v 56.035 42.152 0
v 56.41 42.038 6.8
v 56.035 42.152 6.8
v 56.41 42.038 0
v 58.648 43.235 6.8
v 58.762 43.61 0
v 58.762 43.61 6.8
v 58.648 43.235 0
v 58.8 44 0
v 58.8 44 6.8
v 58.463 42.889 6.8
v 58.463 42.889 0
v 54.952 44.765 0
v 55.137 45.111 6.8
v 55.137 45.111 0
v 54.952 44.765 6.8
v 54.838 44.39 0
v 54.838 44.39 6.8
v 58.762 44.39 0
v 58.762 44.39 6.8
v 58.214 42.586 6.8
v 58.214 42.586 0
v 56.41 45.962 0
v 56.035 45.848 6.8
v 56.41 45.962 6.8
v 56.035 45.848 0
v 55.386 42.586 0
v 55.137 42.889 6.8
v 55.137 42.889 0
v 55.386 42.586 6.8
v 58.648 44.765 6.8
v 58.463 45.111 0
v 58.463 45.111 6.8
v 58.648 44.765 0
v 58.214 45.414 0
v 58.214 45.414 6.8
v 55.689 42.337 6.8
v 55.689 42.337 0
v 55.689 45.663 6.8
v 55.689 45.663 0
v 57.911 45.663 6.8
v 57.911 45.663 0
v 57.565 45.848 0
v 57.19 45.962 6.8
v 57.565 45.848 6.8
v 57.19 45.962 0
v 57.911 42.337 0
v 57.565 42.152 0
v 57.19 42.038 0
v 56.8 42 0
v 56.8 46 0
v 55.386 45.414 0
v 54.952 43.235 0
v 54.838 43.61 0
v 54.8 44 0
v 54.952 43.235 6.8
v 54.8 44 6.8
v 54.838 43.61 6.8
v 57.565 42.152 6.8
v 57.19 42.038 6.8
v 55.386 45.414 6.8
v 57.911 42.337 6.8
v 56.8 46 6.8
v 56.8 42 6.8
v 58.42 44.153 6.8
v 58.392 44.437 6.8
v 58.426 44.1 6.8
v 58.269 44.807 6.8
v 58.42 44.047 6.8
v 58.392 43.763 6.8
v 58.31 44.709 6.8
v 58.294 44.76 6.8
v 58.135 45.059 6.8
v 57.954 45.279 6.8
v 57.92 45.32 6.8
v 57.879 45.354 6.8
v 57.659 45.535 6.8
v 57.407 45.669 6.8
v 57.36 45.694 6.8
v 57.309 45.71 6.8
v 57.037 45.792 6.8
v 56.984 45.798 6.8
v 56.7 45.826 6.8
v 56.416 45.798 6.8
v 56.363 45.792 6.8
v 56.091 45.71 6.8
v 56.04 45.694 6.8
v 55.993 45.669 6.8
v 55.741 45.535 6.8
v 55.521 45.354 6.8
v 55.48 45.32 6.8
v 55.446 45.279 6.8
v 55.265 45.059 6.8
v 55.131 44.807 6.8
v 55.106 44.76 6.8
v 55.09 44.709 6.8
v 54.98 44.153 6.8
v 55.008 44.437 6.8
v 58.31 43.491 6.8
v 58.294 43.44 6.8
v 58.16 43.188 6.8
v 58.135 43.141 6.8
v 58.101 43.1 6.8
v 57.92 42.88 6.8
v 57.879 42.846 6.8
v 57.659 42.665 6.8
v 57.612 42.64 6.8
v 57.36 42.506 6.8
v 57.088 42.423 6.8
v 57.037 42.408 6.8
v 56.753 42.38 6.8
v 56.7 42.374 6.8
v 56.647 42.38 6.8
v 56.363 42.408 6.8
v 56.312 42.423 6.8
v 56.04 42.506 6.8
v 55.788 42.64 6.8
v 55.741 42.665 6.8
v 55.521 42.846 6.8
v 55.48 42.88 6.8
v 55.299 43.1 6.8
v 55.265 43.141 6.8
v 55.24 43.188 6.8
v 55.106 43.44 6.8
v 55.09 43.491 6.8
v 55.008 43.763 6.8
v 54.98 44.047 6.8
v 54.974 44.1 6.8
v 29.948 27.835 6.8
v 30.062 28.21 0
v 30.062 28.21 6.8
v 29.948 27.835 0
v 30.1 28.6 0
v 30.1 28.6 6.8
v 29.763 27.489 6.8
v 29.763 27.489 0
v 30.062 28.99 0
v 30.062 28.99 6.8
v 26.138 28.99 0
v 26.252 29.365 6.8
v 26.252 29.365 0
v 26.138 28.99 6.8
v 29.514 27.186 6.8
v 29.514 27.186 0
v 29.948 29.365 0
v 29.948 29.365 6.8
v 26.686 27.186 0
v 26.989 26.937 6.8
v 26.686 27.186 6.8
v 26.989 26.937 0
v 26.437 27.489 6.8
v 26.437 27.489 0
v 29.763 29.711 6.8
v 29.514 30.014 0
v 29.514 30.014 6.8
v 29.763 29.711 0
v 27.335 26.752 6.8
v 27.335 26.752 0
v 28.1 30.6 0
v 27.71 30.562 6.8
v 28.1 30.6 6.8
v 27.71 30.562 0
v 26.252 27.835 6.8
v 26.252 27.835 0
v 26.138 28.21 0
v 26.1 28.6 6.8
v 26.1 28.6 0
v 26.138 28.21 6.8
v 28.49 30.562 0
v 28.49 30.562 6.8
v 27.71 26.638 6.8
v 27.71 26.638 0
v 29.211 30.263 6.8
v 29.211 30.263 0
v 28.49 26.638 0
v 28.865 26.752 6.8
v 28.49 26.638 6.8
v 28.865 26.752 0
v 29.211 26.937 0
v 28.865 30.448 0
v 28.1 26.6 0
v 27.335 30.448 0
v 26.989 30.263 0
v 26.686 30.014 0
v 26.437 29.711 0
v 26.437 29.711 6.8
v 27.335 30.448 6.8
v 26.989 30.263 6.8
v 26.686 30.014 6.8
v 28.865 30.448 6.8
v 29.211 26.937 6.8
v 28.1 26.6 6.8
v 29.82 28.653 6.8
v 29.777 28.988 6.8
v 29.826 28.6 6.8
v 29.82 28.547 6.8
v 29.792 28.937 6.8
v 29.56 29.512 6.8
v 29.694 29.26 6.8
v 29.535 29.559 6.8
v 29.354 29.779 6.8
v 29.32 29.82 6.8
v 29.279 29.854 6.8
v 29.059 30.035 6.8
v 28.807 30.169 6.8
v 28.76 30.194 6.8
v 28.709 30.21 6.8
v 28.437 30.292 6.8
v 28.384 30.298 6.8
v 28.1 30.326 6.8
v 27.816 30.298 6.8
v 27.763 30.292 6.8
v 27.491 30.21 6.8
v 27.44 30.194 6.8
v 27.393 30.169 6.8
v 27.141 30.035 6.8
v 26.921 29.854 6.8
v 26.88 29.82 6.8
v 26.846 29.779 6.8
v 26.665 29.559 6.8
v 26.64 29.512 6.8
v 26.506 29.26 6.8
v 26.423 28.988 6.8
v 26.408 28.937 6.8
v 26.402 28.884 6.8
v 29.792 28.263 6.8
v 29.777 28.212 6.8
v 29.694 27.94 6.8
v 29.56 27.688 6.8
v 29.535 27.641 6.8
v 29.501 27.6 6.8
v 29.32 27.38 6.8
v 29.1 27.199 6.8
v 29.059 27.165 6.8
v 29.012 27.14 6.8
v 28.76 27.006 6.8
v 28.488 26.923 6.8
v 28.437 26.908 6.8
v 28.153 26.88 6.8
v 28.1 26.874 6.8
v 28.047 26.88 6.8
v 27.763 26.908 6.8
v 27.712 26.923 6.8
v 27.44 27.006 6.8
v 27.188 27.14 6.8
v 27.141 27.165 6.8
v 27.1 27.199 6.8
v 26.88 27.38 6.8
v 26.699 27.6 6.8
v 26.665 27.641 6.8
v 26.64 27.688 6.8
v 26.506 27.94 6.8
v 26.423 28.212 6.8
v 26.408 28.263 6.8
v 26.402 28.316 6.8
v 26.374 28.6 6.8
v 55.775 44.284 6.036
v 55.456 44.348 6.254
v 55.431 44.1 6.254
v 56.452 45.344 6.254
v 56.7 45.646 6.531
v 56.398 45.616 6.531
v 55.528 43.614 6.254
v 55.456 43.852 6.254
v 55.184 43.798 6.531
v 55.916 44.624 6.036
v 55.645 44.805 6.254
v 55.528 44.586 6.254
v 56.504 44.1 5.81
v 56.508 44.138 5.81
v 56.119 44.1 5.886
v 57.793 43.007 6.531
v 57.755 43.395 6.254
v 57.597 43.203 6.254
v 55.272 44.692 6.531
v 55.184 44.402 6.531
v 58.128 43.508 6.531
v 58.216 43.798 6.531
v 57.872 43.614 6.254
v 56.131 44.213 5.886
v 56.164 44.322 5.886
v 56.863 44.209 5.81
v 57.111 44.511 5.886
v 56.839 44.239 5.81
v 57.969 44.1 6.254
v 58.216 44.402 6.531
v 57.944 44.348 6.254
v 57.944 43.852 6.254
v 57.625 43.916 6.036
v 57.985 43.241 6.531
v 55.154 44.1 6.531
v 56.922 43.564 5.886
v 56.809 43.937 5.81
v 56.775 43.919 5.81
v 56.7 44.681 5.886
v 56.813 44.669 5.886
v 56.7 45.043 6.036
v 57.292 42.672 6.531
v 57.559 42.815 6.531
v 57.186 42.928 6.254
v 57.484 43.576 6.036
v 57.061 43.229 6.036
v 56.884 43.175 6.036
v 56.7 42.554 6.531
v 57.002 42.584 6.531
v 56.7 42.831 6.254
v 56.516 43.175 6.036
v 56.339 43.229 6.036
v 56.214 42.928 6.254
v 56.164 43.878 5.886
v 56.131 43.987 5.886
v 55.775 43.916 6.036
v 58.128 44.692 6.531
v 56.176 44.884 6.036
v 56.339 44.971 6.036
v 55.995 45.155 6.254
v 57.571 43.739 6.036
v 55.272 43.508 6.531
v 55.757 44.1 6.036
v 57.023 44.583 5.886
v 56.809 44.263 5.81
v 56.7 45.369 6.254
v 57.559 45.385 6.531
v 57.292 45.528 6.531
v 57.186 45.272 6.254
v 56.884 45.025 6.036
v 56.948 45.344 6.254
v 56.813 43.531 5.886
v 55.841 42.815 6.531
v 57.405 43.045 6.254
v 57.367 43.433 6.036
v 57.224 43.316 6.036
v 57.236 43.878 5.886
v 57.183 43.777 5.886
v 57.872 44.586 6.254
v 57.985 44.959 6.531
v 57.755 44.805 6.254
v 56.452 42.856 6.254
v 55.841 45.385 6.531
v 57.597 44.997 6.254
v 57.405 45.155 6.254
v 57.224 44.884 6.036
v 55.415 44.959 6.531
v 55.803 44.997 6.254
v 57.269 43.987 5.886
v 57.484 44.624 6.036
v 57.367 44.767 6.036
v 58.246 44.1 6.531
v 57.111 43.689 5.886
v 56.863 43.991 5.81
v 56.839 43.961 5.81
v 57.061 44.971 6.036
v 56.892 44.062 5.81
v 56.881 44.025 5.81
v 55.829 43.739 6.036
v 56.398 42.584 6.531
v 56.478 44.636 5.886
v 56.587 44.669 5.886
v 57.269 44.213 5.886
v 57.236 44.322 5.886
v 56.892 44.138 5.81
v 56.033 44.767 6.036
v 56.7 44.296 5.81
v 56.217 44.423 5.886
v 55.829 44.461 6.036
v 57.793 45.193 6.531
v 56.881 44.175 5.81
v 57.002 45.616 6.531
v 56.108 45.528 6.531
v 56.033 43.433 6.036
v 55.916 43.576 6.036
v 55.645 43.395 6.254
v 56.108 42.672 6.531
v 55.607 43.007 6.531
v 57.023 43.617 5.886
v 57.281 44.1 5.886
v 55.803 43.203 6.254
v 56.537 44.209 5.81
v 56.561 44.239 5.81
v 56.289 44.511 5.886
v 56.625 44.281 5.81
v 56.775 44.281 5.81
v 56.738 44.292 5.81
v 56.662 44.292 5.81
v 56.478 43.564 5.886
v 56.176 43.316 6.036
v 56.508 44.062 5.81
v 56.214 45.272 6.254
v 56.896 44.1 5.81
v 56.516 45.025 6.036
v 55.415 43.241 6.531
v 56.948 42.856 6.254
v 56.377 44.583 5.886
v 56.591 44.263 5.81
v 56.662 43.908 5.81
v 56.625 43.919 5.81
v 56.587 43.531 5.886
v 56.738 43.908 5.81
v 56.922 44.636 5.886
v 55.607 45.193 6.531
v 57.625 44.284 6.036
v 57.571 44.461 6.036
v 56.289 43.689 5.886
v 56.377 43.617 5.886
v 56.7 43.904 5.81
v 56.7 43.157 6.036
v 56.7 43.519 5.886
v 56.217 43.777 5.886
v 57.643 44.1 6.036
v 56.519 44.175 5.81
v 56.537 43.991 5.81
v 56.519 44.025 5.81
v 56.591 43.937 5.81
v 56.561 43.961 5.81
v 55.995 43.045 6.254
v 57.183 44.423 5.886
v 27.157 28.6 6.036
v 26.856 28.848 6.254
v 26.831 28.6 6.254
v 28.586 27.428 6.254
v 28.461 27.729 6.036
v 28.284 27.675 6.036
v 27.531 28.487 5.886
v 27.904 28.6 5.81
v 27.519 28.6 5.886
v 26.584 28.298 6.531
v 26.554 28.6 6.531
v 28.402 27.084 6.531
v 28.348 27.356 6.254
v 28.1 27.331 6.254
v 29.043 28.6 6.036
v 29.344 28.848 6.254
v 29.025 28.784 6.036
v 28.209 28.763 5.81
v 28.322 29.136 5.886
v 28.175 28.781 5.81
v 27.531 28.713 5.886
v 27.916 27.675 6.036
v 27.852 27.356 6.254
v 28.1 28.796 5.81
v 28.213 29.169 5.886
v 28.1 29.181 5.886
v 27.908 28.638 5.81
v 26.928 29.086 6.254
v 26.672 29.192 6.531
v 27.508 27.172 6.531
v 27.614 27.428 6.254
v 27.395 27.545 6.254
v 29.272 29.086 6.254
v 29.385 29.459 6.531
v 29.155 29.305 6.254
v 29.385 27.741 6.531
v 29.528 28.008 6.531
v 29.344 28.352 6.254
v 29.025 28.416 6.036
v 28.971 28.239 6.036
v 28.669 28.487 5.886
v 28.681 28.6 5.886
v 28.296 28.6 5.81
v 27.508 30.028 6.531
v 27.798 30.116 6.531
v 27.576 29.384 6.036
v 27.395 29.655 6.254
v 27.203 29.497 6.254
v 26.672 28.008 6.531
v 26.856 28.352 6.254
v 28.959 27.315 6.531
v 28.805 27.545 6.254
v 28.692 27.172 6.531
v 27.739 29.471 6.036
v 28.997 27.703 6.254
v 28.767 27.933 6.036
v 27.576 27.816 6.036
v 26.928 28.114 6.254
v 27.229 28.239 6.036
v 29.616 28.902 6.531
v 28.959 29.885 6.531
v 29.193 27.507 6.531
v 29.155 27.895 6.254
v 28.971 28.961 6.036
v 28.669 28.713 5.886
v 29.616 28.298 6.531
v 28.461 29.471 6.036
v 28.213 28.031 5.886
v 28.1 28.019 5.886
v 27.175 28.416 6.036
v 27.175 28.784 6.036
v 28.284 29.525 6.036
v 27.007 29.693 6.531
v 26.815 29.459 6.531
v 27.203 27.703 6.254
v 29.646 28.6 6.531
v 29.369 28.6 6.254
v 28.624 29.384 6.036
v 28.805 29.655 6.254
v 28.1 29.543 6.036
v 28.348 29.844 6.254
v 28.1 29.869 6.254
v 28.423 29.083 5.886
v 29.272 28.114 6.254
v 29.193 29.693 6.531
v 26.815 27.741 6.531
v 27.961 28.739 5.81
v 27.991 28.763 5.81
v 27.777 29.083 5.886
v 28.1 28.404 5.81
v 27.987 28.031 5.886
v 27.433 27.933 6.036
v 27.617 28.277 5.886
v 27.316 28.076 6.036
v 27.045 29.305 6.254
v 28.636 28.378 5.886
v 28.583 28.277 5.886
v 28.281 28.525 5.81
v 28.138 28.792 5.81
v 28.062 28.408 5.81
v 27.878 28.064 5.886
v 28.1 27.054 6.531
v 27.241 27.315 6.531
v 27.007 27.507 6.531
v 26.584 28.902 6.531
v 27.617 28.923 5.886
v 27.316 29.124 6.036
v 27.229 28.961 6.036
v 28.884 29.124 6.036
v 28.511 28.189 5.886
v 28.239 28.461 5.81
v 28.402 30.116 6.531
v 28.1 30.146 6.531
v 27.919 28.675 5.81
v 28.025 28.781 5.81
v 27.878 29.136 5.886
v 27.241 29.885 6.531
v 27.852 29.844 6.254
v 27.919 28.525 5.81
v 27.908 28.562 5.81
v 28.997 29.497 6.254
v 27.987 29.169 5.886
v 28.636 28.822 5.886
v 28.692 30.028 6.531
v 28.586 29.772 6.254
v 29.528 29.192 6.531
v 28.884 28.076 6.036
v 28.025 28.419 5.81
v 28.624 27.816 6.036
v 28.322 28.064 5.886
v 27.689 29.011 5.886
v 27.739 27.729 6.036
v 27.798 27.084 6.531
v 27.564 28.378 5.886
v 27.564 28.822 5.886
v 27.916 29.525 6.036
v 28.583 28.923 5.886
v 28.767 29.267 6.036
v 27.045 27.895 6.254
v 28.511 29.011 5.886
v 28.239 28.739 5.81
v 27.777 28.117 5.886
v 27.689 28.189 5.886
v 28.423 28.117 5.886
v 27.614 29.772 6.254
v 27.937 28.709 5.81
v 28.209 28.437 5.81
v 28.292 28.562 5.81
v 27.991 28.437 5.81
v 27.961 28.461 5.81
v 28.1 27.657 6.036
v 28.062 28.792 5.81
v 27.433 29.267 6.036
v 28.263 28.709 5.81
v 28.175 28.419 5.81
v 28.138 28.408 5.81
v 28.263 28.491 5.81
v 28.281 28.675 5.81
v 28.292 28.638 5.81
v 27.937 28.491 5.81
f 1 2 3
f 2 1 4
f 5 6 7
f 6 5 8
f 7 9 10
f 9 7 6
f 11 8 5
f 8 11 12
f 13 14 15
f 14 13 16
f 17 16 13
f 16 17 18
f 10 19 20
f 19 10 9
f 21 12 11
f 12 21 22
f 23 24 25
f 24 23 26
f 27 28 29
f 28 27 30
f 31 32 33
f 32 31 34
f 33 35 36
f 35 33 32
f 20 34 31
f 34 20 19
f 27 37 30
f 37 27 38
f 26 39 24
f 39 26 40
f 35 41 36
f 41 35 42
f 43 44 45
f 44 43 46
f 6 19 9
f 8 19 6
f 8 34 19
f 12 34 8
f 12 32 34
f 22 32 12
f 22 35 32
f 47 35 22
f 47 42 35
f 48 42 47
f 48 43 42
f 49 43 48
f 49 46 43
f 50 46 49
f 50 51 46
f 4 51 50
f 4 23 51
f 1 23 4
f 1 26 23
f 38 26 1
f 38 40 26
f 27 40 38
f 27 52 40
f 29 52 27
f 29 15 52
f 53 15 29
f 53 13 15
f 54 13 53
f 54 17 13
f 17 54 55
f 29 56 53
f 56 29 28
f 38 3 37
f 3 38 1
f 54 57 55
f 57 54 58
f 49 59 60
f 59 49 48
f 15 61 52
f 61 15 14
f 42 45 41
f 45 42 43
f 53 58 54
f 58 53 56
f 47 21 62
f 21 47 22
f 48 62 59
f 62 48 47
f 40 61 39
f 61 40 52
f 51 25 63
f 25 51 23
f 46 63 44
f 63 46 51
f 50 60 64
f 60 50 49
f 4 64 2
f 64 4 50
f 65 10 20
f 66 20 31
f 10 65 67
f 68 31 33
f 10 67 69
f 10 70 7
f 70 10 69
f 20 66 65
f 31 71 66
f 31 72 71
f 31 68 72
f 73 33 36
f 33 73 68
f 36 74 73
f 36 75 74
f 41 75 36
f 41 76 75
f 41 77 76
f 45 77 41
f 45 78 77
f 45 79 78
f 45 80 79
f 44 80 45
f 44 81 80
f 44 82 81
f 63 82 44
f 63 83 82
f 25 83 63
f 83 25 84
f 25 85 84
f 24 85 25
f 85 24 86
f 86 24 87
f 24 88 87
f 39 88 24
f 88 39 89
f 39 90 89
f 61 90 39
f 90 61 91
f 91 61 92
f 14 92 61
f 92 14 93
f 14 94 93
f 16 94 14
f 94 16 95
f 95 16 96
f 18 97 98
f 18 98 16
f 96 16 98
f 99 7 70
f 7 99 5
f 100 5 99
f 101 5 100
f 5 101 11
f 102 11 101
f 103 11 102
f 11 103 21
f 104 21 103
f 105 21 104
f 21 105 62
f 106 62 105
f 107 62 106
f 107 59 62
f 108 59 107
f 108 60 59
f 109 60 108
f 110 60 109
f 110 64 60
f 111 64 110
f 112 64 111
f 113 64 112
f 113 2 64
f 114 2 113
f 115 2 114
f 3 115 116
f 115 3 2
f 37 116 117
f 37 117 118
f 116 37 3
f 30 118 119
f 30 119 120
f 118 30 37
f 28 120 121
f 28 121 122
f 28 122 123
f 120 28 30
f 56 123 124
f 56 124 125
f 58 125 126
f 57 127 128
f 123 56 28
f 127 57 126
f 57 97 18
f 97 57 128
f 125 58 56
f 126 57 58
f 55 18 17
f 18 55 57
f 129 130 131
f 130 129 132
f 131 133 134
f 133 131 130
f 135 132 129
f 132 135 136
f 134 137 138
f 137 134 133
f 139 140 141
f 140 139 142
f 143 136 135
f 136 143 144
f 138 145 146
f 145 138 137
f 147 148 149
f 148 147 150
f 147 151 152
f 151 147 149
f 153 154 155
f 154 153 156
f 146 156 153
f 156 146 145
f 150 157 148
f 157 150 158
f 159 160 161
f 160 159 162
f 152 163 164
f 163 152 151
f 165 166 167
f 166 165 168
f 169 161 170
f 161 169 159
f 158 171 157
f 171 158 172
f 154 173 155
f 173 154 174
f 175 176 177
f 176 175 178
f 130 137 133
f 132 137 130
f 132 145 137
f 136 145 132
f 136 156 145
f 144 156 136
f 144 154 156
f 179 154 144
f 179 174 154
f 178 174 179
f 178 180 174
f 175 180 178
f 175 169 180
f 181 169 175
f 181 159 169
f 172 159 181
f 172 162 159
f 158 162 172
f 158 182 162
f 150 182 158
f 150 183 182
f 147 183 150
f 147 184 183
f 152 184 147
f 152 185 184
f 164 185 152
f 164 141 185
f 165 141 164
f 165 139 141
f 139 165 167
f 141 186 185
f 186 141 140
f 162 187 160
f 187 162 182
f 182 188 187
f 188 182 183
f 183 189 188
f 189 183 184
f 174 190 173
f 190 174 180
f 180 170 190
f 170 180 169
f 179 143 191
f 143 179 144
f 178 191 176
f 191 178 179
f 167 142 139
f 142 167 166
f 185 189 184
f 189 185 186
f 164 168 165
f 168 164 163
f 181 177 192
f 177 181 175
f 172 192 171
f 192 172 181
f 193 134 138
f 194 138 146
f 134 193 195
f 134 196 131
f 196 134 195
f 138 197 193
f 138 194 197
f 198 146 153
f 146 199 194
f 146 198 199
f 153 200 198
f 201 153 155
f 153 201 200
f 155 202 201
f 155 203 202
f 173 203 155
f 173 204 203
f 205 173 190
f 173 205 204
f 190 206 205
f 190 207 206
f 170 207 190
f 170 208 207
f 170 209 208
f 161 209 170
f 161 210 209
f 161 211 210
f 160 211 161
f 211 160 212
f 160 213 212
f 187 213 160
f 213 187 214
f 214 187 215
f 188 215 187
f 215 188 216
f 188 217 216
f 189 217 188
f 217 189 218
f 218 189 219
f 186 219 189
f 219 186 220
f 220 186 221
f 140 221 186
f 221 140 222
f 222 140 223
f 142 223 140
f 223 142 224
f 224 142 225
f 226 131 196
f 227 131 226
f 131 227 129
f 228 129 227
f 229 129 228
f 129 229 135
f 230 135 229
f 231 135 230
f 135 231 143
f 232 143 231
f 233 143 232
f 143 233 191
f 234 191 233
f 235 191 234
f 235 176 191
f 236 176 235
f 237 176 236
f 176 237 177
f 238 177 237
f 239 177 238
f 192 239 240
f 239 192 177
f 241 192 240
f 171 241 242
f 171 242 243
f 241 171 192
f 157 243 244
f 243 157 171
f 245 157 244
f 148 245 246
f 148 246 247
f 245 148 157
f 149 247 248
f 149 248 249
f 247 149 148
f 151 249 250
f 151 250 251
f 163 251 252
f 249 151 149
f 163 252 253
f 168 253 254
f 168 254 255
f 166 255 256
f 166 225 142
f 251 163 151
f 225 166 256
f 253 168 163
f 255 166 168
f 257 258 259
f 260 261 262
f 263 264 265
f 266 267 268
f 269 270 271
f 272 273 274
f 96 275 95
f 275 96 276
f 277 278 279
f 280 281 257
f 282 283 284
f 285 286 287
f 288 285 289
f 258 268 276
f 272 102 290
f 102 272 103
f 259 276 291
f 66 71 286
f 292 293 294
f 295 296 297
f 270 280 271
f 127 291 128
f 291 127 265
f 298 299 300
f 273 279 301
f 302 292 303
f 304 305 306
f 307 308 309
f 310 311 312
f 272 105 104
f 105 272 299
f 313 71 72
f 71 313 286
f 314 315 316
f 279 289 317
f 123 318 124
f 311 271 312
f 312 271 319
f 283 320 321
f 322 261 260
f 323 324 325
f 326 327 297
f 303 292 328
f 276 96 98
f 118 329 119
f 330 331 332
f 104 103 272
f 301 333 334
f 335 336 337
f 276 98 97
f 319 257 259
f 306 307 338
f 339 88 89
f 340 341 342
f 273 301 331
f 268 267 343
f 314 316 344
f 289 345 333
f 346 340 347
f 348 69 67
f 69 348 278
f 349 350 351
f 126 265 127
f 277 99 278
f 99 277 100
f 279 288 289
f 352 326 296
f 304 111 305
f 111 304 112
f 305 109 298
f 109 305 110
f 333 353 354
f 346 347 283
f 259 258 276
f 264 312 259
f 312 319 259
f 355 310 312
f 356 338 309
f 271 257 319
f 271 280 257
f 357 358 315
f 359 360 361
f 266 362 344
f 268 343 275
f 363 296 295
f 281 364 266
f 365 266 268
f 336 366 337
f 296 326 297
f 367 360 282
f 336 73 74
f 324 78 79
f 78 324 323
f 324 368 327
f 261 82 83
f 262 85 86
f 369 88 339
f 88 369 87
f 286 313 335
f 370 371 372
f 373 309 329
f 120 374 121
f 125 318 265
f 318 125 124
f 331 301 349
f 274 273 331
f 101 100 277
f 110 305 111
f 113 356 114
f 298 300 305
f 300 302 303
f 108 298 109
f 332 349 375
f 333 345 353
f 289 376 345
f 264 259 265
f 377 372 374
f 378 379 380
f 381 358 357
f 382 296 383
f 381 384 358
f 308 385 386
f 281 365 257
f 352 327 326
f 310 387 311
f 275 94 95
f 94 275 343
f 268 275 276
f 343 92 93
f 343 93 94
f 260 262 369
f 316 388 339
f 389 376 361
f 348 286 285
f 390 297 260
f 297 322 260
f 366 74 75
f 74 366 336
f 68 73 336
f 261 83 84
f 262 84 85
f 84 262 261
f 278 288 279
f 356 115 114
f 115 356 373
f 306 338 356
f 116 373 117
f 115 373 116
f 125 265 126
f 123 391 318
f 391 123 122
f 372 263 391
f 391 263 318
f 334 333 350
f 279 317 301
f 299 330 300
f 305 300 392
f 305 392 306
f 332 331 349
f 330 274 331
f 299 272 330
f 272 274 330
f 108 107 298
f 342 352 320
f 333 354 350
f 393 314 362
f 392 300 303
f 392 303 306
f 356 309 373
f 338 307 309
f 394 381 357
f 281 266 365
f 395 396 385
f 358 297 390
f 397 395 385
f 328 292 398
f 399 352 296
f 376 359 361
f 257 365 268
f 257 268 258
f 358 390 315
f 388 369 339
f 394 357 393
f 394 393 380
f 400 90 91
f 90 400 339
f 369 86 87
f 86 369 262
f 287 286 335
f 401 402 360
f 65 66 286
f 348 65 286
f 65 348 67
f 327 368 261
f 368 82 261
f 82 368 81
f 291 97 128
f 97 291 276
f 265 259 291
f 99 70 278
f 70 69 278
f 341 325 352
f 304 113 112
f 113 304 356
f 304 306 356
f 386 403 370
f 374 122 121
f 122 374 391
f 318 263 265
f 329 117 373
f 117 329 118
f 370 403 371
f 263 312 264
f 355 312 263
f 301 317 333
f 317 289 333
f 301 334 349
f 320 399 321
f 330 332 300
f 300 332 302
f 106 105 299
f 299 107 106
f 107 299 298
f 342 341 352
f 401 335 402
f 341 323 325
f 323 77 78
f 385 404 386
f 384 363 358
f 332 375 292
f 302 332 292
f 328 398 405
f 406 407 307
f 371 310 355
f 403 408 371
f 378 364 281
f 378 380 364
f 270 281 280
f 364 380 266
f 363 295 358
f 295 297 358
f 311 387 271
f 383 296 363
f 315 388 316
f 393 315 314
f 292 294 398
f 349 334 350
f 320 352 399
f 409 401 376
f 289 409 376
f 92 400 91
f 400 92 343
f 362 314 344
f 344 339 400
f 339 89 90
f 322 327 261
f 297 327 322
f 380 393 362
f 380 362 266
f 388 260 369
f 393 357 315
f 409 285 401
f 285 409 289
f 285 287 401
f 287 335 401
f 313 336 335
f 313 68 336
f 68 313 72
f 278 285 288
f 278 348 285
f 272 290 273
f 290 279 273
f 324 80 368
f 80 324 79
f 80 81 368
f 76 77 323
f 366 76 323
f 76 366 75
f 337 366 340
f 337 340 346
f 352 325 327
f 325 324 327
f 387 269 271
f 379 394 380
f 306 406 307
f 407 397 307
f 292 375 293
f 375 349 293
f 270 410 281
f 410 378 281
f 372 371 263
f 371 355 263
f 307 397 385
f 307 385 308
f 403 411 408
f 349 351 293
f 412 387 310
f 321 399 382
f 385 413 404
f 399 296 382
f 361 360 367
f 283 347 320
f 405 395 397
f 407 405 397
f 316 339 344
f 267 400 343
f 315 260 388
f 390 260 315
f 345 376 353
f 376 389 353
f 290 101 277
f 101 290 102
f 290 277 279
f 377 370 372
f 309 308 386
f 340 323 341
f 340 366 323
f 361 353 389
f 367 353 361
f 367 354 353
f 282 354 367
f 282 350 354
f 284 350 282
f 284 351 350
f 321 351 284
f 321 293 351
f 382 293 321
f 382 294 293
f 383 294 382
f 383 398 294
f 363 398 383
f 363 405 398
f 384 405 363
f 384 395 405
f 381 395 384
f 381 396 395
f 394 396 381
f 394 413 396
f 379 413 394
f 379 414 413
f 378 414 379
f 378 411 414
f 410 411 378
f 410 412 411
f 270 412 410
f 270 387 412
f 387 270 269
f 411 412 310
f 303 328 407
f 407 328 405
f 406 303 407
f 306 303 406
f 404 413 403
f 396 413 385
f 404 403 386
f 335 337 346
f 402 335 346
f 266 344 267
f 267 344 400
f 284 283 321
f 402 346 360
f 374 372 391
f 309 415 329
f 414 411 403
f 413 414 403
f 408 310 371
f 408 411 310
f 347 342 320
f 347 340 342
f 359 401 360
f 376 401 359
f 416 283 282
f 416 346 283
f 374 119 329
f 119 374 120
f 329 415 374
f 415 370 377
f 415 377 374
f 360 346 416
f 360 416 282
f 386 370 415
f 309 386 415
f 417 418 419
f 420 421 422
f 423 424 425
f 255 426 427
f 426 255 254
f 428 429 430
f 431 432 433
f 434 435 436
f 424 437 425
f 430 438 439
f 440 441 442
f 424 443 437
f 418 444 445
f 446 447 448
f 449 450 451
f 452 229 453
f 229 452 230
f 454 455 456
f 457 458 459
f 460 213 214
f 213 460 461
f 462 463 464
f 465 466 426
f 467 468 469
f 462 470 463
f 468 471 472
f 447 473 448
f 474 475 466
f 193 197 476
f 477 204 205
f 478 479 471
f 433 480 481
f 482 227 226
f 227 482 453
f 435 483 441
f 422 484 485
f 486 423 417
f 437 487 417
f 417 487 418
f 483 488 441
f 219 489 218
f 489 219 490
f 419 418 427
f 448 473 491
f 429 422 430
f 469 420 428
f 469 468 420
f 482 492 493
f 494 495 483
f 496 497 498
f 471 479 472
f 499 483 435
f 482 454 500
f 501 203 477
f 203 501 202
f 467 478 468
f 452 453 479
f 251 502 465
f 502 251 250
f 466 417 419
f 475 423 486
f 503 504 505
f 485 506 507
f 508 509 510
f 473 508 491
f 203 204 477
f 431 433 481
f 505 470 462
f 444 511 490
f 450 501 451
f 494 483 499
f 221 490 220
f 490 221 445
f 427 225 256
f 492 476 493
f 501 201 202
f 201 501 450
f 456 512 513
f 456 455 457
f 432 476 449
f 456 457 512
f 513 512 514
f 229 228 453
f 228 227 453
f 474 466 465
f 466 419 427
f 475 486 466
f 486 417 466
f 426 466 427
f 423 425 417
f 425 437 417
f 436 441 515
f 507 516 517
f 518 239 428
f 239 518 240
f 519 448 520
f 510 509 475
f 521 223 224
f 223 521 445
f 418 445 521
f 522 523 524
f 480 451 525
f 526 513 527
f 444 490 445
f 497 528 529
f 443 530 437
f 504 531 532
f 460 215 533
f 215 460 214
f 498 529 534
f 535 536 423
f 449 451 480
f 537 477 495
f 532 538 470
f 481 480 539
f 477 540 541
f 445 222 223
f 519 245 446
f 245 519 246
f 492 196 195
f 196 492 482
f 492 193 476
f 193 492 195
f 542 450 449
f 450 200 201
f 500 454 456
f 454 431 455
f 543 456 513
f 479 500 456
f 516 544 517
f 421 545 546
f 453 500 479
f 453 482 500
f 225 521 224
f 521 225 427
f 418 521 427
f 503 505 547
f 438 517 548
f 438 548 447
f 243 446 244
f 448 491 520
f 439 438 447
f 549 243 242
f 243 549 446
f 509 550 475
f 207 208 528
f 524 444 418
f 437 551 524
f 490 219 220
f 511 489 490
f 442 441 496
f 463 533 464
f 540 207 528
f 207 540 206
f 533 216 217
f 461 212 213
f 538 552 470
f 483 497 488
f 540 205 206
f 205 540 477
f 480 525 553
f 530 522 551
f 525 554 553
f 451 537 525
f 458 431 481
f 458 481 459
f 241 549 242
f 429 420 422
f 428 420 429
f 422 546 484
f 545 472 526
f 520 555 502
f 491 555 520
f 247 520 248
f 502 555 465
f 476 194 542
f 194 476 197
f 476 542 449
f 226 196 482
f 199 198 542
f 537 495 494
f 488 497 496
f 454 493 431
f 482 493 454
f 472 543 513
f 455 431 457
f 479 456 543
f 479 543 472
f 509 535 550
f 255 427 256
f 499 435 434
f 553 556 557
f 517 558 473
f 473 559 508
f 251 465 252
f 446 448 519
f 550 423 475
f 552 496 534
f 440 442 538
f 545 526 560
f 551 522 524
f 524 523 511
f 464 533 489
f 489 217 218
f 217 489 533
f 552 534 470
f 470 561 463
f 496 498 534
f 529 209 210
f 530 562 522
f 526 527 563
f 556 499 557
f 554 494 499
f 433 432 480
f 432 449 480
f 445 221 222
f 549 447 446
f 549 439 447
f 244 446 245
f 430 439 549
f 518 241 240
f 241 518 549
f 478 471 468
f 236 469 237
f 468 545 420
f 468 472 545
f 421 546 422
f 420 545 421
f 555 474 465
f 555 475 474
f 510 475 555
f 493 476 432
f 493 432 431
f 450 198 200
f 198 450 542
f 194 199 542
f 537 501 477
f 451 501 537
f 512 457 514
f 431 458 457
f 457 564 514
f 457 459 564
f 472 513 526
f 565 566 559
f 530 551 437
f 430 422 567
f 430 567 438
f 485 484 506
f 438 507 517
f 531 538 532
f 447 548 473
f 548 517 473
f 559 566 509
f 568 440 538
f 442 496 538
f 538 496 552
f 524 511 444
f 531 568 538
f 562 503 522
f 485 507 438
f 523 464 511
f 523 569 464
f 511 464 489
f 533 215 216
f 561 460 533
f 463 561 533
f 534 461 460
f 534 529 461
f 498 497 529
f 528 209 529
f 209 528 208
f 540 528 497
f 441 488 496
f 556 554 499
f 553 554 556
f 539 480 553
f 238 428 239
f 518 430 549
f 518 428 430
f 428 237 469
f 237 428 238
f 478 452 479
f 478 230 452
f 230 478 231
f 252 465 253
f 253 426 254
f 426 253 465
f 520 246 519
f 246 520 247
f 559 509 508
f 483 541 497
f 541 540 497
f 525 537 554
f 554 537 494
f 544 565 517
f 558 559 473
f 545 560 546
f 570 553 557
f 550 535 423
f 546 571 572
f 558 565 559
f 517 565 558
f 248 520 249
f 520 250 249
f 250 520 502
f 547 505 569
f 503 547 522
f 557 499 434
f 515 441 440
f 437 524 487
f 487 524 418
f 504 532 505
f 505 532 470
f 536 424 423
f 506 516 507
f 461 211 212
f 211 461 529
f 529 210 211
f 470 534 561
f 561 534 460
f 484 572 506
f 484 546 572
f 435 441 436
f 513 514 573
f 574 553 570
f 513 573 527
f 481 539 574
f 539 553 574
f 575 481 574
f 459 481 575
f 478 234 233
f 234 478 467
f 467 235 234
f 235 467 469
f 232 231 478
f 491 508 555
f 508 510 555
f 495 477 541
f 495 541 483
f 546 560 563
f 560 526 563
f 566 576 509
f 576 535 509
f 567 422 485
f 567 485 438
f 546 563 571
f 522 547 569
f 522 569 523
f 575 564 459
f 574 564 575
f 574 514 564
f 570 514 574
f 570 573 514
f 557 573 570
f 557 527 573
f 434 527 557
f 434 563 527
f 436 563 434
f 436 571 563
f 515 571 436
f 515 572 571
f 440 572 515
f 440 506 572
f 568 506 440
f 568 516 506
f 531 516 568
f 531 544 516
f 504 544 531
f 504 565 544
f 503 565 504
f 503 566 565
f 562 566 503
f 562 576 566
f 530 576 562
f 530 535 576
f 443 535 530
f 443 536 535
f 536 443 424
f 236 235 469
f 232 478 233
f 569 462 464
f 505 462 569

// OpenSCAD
// OpenSCAD 2019.05
// Tiva Case - enclosure, REV-001
// Joe Haas, KE0FF, 12/16/2021
// This is an enclosure for an EK-TM4C123GXL LaunchPad board and a custom LaunchPad
//	carrier board.
//
// Rev-002, 12/21/2021
//	incorporated fixes from first print run
//	increased lid thickness to provide more room for LP board
//
// Rev-001, 12/16/2021
//	initial code -- copied from uxcover

//use <char.scad>

//----------------------------------------------------------------------------------------------------------------------
// User defined parameters.  Modify these to suit a particular application
// NOTE: All data in this file is in mm

//----------------------------------------------------------------------------------------------------------------------
// parametric variables:

width = 67.5;
wcut = 10;
length = 87.2;
lcut = 10;
height = 20.8; //28.2;
heightl = 8;
lheight = 15;
wthick = 3.5;
wthickt = 1.5;
crad = 5;
crad2 = crad/2;

// X-rulers
//#translate([-.69,0,0]) cube([0.01,30,50]);	// ruler
//#translate([175.41,0,0]) cube([0.01,30,50]);	// inside main void ruler 1
//#translate([1.67,0,0]) cube([0.01,30,50]);	// inside main void ruler 2
//#translate([175.34,0,0]) cube([0.01,30,50]);	// outside shroud ruler 2
// Y-rulers
//#translate([0,23.81,0]) cube([180,0.01,50]);	// ruler
//#translate([0,22.36 ,0]) cube([180,0.01,50]);	// ruler
// Z-rulers
//#translate([0,0,0]) cube([10,40,.01]);	// ruler
//#translate([0,0,2.04]) cube([9,40,.01]);	// ruler

// Set each variable to "1" to render that part (only one part at a time).  Set all = "0" to enable composite
//	rendering (below).

plotlid = 0;
plotcase = 0;
plotlp = 1;

/////////////////////////////////////

if(plotlid) lid(1);
if(plotlp) lid_lpipe();
if(plotcase) case();

// Composite plot.  Places all elements in an assembly orientation

if(!plotlid && !plotlp && !plotcase){
//	translate([0,0,0]) tiva_assy();
	difference(){
		union(){
			color("darkslategray",0.98) case();
			translate([0,length,height+heightl]) rotate([180,0,0]) color("darkslategray",1.0) lid(1);
			translate([0,length,height+heightl]) rotate([180,0,0]) lid_lpipe();
		}
//		translate([-1,40,-1]) cube([90,60,90]);		// cut-away viewing
	}
}

//////////////////****************\\\\\\\\\\\\\\\\\\
				//    modules     \\
				//****************\\

///////////////
// Bottom shell

module case(){
	difference(){
		union(){
			difference(){
				union(){
					cube([width,length,height]);
//					translate([19.1,88,0]) cube([2,2,23.6]); // test-ruler
				}
				translate([19.1,76,15.4]) cube([10.5,16,8.1]); 							// USB shroud
				cube([crad,crad,60], center=true);										// corner notch
				translate([width,0,0]) cube([crad,crad,60], center=true);				// corner notch
				translate([0,length,0]) cube([crad,crad,60], center=true);				// corner notch
				translate([width,length,0]) cube([crad,crad,60], center=true);			// corner notch
				translate([3.5,3.5,4.5]) cube([60.5,80.2,21.2]);						// main hog-out
				translate([3.5+6.5,3.5,4.5-2.5]) cube([60.5-13,80.2,5]);				// "Y" under PCB hog-out
				translate([3.5,3.5+6+3,4.5-2.5]) cube([60.5,80.2-12-6,5]);				// "X" under PCB hog-out
				translate([57.3,47,.5]) cube([5,11.4,4.5]);								// jtag port
				translate([width/2,length/2,11]) tiva_lp_mtg(10);						// pcb mtg holes
				translate([width/2,length/2,0]) tiva_lp_mtg_cs();						// pcb mtg hole counter-sinks
				translate([.08+(width/2),1.5,9]) rotate([270,0,0]) db9();				// DB9 cutout
				translate([width/2,length/2,11]) sma_pilot();							// sma pilots (RF3 & RF4)
				translate([width/2,length/2,11]) sma2_pilot();							// sma pilots, RF2
				translate([width/2,length/2+21.4,11]) sma2_pilot();						// sma pilots, RF1
				translate([6.5,1.5,15.9]) cube([width-12.5,4,5]);						// tiva groove
//				translate([(width-15)/2,-.01,height-2.7]) rotate ([-20,0,0]) cube([15,wthickt+4,2.8]);		// lip0
//				translate([(width-15)/2,-.01,height-2.7]) rotate ([0,0,-10]) polygon([0,0],[);		// lip0
//				translate([width/2,9.99,25.6]) rotate([90,0,0]) rotate([0,0,45]) cylinder(h=10,r1=(21.2/2)+1.76,r2=21.2/2,$fn=4);
//				translate([(width-15)/2,-.01,height-2.7]) cube([15,wthickt+4,2.8]);		// lip0
			}
			translate([crad2,crad2,0]) cylinder(r=crad/2, h=height, $fn=32, center=false);		// corner radius (x4)
			translate([width-crad2,crad2,0]) cylinder(r=crad/2, h=height, $fn=32, center=false);
			translate([crad2,length-crad2,0]) cylinder(r=crad/2, h=height, $fn=32, center=false);
			translate([width-crad2,length-crad2,0]) cylinder(r=crad/2, h=height, $fn=32, center=false);
		}
//		translate([17.5,length-4,18]) pilot(1);											// usb pilot
		translate([15,length-4,17.3]) pilot();											// pilot
		translate([47,length-4,17.3]) pilot();											// pilot
		translate([4,20,17.3]) rotate([0,0,90]) pilot();								// pilot
		translate([4,67,17.3]) rotate([0,0,90]) pilot();								// pilot
		translate([width-4,20,17.3]) rotate([0,0,90]) pilot();							// pilot
		translate([width-4,67,17.3]) rotate([0,0,90]) pilot();							// pilot
		translate([15,15,1.5]) linear_extrude(1) text("REV 2", size=6);					// version & PN texts
		translate([15,25,1.5]) linear_extrude(1) text("TivaLP bot", size=6);
	}
}

////////////
// Top cover

module lid(hole){
	difference(){
		union(){
			difference(){
				union(){
					cube([width,length,heightl]);													// main lid
				}
				cube([crad,crad,60], center=true);													// corner nibble
				translate([width,0,0]) cube([crad,crad,60], center=true);							// corner nibble
				translate([0,length,0]) cube([crad,crad,60], center=true);							// corner nibble
				translate([width,length,0]) cube([crad,crad,60], center=true);						// corner nibble
				translate([wthick,wthick,2]) cube([60.5,80.2+wthickt,21.2]);						// main hog-out
				translate([0,length,(height)]) rotate([180,0,0]) tiva_assy(1);		// "1" param burns button/LP holes
			}
			translate([wcut/2,wthick,0]) cube([width-wcut,wthick,lheight]);							// lip
//			translate([(width-15)/2,length-(wthickt)-.001,5]) cube([15,wthickt,5.5]);				// lip0
			translate([wcut/2,length-(wthick/2)-(wthickt)-.001,1]) cube([width-wcut,wthick/2,8]);	// lip0
			translate([wcut/2,length-(wthick/2)-(wthickt)-2,1]) cube([2,2.1,8]);					// lip0 tie-in
			translate([width-(wthick*2),length-(wthick/2)-(wthickt)-2,1]) cube([2,2.1,8]);			// lip0 tie-in
			translate([wthick,wcut/2,0]) cube([wthick,length-wcut,lheight]);						// lip
			translate([width-(2*wthick),wcut/2,0]) cube([wthick,length-wcut,lheight]);				// lip
			translate([crad2,crad2,0]) cylinder(r=crad/2, h=heightl, $fn=32, center=false);			// corner
			translate([width-crad2,crad2,0]) cylinder(r=crad/2, h=heightl, $fn=32, center=false);	// corner
			translate([crad2,length-crad2,0]) cylinder(r=crad/2, h=heightl, $fn=32, center=false);	// corner
			translate([width-crad2,length-crad2,0]) cylinder(r=crad/2, h=heightl, $fn=32, center=false);	// corner
		}
		translate([19.1,-1,lheight-1.7-8]) cube([10.5,16,8.1]);											// USB housing
		translate([15,4,lheight-3.5]) pilot();														// pilot
		translate([47,4,lheight-3.5]) pilot();														// pilot
		translate([4,20,lheight-3.5]) rotate([0,0,90]) pilot();										// pilot
		translate([4,67,lheight-3.5]) rotate([0,0,90]) pilot();										// pilot
		translate([width-4,20,lheight-3.5]) rotate([0,0,90]) pilot();								// pilot
		translate([width-4,67,lheight-3.5]) rotate([0,0,90]) pilot();								// pilot
		translate([15,10,1.5]) linear_extrude(1) text("REV 2", size=6);								// version and PN texts
		translate([15,20,1.5]) linear_extrude(1) text("TivaLP top", size=6);
	}
}

/////////////////////////////////////
// Light pipe (inserts into top cover)

module lid_lpipe(hole){
	translate([0,length,(height+heightl)]) rotate([180,0,0]) tiva_assy(10);			// "10" param creates stand-alone LP
}

////////////////////////////////////////////////////////////////////////
// LaunchPad assembly (not for 3D printing, only for assembly fit check)

module tiva_assy(hole=0){
	translate([(width/2)-30.05,(length/2)-37.7,11-6.4]) difference(){
		union(){
			if(hole == 0){
				translate([14.4,0.1,12.5]) pbsw(hole);
				translate([45.2,0.1,12.5]) pbsw(hole);
				translate([49.1,43,12.5]) pbsw(hole);
				color("green",1.0) cube([60.1,75.4,.8]);
				color("black",1.0) translate([6.4,6.6,0.01]) cube([4.9,25.7,12]);
				color("black",1.0) translate([49.5,6.6,0.01]) cube([4.9,25.7,12]);
				color("red",1.0) translate([5,-4.3,11.8]) cube([50.8,66,.8]);
				translate([13.3,0,0]) sma();
				translate([47,0,0]) sma();
				translate([5,41.2,12.5]) rotate([0,0,270]) usb();
				translate([14,61.7,12.5]) rotate([0,0,180]) usb();
				color("white",.5) translate([53.7,36.2,12.5]) cylinder(r=.5, h=20, $fn=32, center=false);
				color("white",1.0) translate([54.4,42.1,-4.5]) cube([3.3,9.2,4.5]);
			}else{
				if(hole == 10){
					difference(){
						union(){
							color("white", 0.8) translate([56.6-3.5,-44+length-5.9,lheight+2.4]) cylinder(r=2, h=6.8, $fn=32, center=false);
							color("white", 0.8) translate([27.9-3.5,-28.6+length-5.9,lheight+2.4]) cylinder(r=2, h=6.8, $fn=32, center=false);
						}
						translate([56.5-3.5,43.1-5.9,lheight+1.4]) sphere(r=2,$fn=32);
						translate([27.9-3.5,-28.6+length-5.9,lheight+1.4]) sphere(r=2,$fn=32);
					}
				}else{
					translate([56.6-3.5,-44+length-5.9,12.4]) cylinder(r=2, h=10, $fn=32, center=false);
					translate([27.9-3.5,-28.6+length-5.9,12.4]) cylinder(r=2, h=10, $fn=32, center=false);
					translate([18.5-3.5,-5.9+7,12.5]) pbsw(hole);
					translate([18.5-3.5+30.4,-5.9+7,12.5]) pbsw(hole);
					translate([53.6-3.5,-37.2+length-5.9,12.5]) pbsw(hole);
				}
			}
		}		
		translate([30.05,37.7,6.4]) tiva_lp_mtg();
	}
}

//////////////////////////////
// Tiva carrier mounting holes

module tiva_lp_mtg(depth=2){
	translate([-30.05,-37.7,-6.4]) union(){
		translate([3.4,3.4,0]) cylinder(r=1.6, h=depth, $fn=32, center = true);		// #4 holes
		translate([56.5,3.4,0]) cylinder(r=1.6, h=depth, $fn=32, center = true);
		translate([3.4,71.9,0]) cylinder(r=1.6, h=depth, $fn=32, center = true);
		translate([56.5,71.9,0]) cylinder(r=1.6, h=depth, $fn=32, center = true);
	}
}

//////////////////////////////////////////
// Tiva carrier mounting hole countersinks

module tiva_lp_mtg_cs(screw=4){
	if(screw == 2){
		translate([-30.05,-37.7,.64]) union(){
			translate([3.4,3.4,0]) cylinder(r1=4.37/2, r2=2.18/2, h=1.3, $fn=32, center = true);	// #2 countersinks
			translate([56.5,3.4,0]) cylinder(r1=4.37/2, r2=2.18/2, h=1.3, $fn=32, center = true);
			translate([3.4,71.9,0]) cylinder(r1=4.37/2, r2=2.18/2, h=1.3, $fn=32, center = true);
			translate([56.5,71.9,0]) cylinder(r1=4.37/2, r2=2.18/2, h=1.3, $fn=32, center = true);
		}
	}else{
		translate([-30.05,-37.7,.64]) union(){
			translate([3.4,3.4,0]) cylinder(r1=5.72/2, r2=2.84/2, h=1.7, $fn=32, center = true);	// #4 countersinks
			translate([56.5,3.4,0]) cylinder(r1=5.72/2, r2=2.84/2, h=1.7, $fn=32, center = true);
			translate([3.4,71.9,0]) cylinder(r1=5.72/2, r2=2.84/2, h=1.7, $fn=32, center = true);
			translate([56.5,71.9,0]) cylinder(r1=5.72/2, r2=2.84/2, h=1.7, $fn=32, center = true);
		}
	}
}

/////////////////////////////////////
// SMA connector (fit check artifact)
module sma(){
  union(){
	translate([-4.75,0,-4.6]) cube([9.5,6.7,7.9]);
	translate([0,0,-.75]) rotate([90,0,0]) cylinder(r=3.1, h=7.5, $fn=32);
  }
}

/////////////////////////////////////////////////////
// SMA pilot holes and clearences (part of 3D render)

module sma_pilot(){
	translate([-30.05,-37.7,-6.4]) union(){
		translate([7.75,0,-4.1]) cube([11.5,3,7.9]);									// panel face clearance, RF4
		translate([13.3,.1,-.75]) rotate([90,0,0]) cylinder(r=.8, h=8, $fn=32);			// barrel pilot, RF4
//		translate([13.3,.1,-.75]) rotate([90,0,0]) cylinder(r=1.5, h=2.5, $fn=32);
		translate([7.75+(47-13.3),0,-4.1]) cube([11.5,3,7.9]);							// panel face clearance, RF3
		translate([47,.1,-.75]) rotate([90,0,0]) cylinder(r=.8, h=8, $fn=32);			// barrel pilot, RF3
//		translate([47,.1,-.75]) rotate([90,0,0]) cylinder(r=1.5, h=2.5, $fn=32);
	}
}

/////////////////////////////////////////////////
// Side-mount SMA pilot holes (part of 3D render)

module sma2_pilot(){
  translate([-32,-21+38.2,-6.4]) rotate([0,0,270]) union(){
	translate([8.05,0,-4.1]) cube([10.5,3,7.9]);
	difference(){	// slope roof
		translate([8.05+5.25,width+.035,-4.1]) rotate([0,90,0]) cylinder(h=10.5, r=width+.4, $fn=256, center=true);
		translate([7.9,-2,-(width*2)-3-4.1]) cube([13,(width*2)+10,(width*2)+10]);
		translate([7.9,3,-4.1]) cube([13,(width*2)+10,(width*2)+10]);		
	}
	translate([13.3,.1,-.75]) rotate([90,0,0]) cylinder(r=.8, h=8, $fn=32);
//	translate([13.3,.1,-.75]) rotate([90,0,0]) cylinder(r=1.5, h=2.5, $fn=32);
  }
}

/////////////////////////
// scant opening for PBSW

module pbsw(hole=0){
  union(){
	if(hole == 0){
		color("darkslategray",1.0) translate([-3.05,-3.05,0]) cube([6.1,6.1,3.4]);
		color("black",1.0) translate([0,0,0]) cylinder(r=1.7, h=5, $fn=32, center=false);
		color("white",.5) translate([0,0,0]) cylinder(r=.5, h=20, $fn=32, center=false);
	}else{
		translate([0,0,-.1]) cylinder(r=4/2, h=10, $fn=32, center=false);
	}
  }
}

/////////////////////////////
// USB connectors (fit check)

module usb(){
  union(){
	color("silver",1.0) translate([-3.75,-1.1,0]) cube([7.5,5.8,2.5]);
  }
}

/////////////////////
// generic pilot hole

module pilot(diameter=2){
  union(){
	rotate([90,0,0]) cylinder(d=diameter, h=10, $fn=32, center=true);
  }
}

/////////////////////////
// DB9 cutout (3D render)

module db9(){
	translate([0,0,2.05]) union(){
		translate([0,0,0]) cube([18.44,10.06,15], center=true);								// DB9 cutout
		translate([0,0,3.0]) cube([32,14,10.1], center=true);								// DB9 CM
		translate([(101.60-76.20)/2,0,0]) cylinder(r=1.6, h=20, $fn=16, center=true);		// db9 holes,	#1
		translate([-(101.60-76.20)/2,0,0]) cylinder(r=1.6, h=20, $fn=16, center=true);		//				#2
	}
}

// EOF
